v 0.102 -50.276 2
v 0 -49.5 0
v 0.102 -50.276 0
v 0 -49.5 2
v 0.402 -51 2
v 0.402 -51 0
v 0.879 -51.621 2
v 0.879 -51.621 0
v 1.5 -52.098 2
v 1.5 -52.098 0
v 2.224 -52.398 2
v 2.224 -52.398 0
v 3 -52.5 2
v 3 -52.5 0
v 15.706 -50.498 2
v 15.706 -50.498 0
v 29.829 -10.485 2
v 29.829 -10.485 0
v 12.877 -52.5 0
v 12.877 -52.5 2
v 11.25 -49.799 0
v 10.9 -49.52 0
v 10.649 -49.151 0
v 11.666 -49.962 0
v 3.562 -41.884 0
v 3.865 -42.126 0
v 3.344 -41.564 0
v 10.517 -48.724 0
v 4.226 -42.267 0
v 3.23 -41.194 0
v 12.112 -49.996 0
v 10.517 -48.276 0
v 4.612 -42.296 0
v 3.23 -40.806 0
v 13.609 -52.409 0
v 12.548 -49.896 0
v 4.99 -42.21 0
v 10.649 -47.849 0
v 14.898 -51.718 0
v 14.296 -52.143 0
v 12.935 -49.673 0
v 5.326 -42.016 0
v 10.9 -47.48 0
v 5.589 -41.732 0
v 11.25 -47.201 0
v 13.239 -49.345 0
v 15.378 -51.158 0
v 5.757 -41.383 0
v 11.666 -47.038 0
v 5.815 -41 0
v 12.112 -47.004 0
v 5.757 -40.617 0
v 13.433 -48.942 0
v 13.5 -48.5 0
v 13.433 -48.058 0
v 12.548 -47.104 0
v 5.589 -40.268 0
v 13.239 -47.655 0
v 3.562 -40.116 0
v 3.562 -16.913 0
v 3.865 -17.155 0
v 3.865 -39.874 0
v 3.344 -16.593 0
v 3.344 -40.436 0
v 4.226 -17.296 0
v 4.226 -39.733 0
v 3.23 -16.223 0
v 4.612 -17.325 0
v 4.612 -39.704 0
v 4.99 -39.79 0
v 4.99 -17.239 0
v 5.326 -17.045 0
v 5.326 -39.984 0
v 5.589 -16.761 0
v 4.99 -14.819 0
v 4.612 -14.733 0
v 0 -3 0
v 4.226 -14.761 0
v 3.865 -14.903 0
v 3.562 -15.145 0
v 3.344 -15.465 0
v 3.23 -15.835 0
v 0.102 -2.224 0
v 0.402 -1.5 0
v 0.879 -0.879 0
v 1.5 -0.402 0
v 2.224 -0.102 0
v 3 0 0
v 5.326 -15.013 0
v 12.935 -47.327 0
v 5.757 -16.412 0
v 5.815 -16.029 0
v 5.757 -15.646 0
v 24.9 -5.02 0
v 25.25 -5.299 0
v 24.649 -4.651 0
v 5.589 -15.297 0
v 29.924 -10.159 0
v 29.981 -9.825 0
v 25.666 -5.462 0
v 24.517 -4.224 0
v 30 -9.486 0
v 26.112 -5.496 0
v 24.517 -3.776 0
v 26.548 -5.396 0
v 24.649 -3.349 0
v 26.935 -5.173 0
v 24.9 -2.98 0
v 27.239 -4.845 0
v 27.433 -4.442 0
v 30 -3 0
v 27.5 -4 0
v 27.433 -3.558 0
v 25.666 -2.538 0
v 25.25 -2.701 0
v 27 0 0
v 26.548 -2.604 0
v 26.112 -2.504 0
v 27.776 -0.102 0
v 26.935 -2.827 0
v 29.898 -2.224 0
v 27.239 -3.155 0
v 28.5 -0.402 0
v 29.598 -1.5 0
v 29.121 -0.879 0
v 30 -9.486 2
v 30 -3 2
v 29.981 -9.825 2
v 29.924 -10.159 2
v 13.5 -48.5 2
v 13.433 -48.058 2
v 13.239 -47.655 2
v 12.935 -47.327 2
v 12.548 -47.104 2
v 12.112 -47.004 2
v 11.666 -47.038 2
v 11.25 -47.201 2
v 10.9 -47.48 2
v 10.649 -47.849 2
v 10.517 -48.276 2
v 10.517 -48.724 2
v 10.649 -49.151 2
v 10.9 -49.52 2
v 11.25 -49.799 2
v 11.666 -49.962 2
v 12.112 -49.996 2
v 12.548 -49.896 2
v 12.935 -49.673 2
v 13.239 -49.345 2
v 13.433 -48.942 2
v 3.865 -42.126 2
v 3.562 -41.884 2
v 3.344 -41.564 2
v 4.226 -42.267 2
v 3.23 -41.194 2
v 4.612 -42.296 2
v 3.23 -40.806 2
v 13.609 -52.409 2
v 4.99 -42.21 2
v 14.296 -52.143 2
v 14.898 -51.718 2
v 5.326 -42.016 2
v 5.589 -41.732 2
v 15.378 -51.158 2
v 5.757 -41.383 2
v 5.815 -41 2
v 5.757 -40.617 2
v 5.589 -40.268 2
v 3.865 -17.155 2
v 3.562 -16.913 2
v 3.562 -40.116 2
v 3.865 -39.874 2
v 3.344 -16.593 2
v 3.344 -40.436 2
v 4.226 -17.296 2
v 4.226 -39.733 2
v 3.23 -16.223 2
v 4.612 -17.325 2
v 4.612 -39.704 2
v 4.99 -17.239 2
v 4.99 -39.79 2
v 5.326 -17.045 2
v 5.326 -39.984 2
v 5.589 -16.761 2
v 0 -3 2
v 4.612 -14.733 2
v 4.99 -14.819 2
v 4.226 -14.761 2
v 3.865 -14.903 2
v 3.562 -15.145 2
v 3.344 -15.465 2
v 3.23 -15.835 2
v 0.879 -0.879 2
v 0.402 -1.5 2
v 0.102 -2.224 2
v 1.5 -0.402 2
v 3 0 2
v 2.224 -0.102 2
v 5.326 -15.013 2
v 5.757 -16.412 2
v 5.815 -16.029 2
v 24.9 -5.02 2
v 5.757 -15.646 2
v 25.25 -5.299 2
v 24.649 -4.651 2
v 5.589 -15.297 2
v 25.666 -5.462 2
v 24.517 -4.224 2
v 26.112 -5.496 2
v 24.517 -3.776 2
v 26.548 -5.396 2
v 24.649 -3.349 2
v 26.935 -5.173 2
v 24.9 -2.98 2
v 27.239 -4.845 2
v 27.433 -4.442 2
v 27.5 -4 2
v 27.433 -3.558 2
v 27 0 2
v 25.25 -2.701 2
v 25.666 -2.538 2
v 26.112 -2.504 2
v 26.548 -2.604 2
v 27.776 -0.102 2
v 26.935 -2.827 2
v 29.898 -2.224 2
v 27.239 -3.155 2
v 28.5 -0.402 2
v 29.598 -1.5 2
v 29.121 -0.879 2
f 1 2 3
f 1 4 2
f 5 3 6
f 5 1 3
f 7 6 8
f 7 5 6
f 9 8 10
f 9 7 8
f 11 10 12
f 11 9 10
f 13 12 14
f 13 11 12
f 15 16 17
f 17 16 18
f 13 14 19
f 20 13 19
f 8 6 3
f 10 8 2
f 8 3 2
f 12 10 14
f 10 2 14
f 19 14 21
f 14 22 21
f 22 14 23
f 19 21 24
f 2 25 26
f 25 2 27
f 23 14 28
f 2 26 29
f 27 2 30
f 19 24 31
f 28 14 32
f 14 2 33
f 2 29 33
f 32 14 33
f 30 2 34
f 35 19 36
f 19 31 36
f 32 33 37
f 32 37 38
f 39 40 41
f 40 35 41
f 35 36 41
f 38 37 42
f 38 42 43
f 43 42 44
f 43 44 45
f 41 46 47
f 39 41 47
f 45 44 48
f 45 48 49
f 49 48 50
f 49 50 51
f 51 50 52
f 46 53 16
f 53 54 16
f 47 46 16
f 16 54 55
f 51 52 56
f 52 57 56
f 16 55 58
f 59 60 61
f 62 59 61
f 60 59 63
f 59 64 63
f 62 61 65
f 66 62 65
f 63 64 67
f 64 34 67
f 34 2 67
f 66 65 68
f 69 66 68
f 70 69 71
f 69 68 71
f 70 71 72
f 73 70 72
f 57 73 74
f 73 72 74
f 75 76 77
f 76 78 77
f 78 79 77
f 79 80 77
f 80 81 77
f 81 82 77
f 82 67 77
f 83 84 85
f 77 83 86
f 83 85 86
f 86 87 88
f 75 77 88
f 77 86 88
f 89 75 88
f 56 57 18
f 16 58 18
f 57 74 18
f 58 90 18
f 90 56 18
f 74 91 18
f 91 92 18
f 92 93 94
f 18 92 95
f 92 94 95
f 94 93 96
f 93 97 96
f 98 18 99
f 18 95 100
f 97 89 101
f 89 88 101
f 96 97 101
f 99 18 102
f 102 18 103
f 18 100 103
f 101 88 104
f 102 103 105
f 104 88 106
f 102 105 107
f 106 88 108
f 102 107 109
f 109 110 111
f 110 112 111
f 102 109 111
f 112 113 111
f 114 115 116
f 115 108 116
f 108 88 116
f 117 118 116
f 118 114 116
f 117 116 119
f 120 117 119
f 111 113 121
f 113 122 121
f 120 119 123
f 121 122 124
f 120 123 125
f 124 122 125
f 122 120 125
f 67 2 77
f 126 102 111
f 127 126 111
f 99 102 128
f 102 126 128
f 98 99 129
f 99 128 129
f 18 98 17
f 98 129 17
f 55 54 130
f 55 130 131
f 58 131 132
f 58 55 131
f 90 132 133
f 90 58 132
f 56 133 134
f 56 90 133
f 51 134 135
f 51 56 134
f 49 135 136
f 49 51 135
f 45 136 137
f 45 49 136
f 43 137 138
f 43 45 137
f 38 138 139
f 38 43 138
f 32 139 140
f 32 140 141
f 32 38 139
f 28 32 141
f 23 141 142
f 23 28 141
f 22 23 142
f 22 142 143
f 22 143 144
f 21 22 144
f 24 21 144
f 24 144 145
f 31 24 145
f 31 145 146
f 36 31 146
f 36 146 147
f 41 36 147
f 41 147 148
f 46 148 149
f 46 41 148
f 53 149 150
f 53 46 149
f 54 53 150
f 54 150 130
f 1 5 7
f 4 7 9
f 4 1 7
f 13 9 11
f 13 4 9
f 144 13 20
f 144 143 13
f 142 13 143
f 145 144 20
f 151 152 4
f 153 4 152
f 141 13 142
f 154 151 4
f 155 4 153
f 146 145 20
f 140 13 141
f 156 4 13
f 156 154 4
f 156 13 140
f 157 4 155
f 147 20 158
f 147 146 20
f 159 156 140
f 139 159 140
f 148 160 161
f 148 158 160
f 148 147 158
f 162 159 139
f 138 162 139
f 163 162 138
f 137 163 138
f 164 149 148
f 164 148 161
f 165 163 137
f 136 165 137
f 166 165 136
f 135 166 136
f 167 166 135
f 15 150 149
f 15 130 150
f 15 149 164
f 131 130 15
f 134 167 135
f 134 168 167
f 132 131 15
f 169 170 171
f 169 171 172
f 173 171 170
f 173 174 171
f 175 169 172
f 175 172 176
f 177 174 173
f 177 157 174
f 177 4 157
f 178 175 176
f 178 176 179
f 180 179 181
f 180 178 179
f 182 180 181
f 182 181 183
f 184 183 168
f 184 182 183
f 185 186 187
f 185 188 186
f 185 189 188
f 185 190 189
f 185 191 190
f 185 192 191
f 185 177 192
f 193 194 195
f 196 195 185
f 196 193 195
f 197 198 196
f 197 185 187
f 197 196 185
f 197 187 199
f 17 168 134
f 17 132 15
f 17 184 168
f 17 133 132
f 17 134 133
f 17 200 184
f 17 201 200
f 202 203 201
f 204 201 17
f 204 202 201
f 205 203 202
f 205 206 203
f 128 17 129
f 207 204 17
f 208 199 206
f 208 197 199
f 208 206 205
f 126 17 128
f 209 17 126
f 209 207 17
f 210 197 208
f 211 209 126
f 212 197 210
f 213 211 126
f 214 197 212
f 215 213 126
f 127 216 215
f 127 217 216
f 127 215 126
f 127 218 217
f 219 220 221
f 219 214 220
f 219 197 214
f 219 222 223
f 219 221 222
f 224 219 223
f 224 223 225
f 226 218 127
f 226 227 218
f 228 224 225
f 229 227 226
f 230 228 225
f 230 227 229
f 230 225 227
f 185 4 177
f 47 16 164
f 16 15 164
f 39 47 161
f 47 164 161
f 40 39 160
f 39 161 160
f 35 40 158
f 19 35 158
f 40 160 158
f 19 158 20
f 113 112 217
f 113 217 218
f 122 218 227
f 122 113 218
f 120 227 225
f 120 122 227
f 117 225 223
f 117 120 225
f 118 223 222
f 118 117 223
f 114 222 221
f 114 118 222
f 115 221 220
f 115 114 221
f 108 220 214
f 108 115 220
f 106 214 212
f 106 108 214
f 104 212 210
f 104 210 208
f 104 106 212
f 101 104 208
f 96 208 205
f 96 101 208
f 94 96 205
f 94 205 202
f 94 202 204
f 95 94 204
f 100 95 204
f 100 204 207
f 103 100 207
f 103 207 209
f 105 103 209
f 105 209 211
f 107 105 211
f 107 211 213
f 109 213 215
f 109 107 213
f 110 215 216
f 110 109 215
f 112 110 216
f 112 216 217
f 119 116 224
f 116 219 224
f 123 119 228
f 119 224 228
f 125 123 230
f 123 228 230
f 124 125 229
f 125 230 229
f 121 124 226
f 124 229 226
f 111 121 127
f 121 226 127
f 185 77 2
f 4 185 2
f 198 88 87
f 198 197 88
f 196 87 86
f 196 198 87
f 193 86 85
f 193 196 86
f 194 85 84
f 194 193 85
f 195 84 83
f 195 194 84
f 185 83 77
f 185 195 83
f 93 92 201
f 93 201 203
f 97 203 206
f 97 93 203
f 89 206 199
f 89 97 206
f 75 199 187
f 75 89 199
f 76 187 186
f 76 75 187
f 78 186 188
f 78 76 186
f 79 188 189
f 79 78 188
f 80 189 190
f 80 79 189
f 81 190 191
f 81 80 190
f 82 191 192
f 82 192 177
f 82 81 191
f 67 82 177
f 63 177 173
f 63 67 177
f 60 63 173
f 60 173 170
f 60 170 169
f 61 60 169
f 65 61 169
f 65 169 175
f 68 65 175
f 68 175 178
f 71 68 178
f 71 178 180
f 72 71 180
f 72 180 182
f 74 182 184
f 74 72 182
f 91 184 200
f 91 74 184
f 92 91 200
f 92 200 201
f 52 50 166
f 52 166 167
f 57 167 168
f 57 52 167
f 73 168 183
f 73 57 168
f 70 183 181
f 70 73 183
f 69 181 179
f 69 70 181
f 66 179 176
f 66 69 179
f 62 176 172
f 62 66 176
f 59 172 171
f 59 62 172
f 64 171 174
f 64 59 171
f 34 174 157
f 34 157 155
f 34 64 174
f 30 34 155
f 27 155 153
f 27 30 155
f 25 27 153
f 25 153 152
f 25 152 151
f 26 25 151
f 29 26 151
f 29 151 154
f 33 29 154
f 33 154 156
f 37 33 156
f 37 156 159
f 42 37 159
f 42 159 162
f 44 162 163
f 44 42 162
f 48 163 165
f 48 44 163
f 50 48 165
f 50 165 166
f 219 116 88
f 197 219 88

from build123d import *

# Parameters (mm, degrees)
SKETCH_1_R      = 1.5
SKETCH_1_R_2    = 1.3
EXTRUDE_1_DEPTH = 2
FILLET_1_R      = 3


with BuildPart() as part:
    # 草图1 → 凸台-拉伸1 (new body)
    with BuildSketch(Plane.XY):
        Polygon((30, 0), (0, 0), (0, -52.5), (15, -52.5), (30, -10), align=None)
        with Locations((26, -4)):
            Circle(SKETCH_1_R, mode=Mode.SUBTRACT)
        with Locations((12, -48.5)):
            Circle(SKETCH_1_R, mode=Mode.SUBTRACT)
        with Locations((4.515040622, -41)):
            Circle(SKETCH_1_R_2, mode=Mode.SUBTRACT)
        with Locations((4.515040622, -16.028894545)):
            Circle(SKETCH_1_R_2, mode=Mode.SUBTRACT)
    extrude(amount=EXTRUDE_1_DEPTH)

    # 圆角1
    fillet_1_edges = [part.edges().sort_by_distance(p)[0] for p in [
        (30, -10, 1),
        (15, -52.5, 1),
        (0, -52.5, 1),
        (0, 0, 1),
        (30, 0, 1),
    ]]
    fillet(fillet_1_edges, radius=FILLET_1_R)


solid = part.part
